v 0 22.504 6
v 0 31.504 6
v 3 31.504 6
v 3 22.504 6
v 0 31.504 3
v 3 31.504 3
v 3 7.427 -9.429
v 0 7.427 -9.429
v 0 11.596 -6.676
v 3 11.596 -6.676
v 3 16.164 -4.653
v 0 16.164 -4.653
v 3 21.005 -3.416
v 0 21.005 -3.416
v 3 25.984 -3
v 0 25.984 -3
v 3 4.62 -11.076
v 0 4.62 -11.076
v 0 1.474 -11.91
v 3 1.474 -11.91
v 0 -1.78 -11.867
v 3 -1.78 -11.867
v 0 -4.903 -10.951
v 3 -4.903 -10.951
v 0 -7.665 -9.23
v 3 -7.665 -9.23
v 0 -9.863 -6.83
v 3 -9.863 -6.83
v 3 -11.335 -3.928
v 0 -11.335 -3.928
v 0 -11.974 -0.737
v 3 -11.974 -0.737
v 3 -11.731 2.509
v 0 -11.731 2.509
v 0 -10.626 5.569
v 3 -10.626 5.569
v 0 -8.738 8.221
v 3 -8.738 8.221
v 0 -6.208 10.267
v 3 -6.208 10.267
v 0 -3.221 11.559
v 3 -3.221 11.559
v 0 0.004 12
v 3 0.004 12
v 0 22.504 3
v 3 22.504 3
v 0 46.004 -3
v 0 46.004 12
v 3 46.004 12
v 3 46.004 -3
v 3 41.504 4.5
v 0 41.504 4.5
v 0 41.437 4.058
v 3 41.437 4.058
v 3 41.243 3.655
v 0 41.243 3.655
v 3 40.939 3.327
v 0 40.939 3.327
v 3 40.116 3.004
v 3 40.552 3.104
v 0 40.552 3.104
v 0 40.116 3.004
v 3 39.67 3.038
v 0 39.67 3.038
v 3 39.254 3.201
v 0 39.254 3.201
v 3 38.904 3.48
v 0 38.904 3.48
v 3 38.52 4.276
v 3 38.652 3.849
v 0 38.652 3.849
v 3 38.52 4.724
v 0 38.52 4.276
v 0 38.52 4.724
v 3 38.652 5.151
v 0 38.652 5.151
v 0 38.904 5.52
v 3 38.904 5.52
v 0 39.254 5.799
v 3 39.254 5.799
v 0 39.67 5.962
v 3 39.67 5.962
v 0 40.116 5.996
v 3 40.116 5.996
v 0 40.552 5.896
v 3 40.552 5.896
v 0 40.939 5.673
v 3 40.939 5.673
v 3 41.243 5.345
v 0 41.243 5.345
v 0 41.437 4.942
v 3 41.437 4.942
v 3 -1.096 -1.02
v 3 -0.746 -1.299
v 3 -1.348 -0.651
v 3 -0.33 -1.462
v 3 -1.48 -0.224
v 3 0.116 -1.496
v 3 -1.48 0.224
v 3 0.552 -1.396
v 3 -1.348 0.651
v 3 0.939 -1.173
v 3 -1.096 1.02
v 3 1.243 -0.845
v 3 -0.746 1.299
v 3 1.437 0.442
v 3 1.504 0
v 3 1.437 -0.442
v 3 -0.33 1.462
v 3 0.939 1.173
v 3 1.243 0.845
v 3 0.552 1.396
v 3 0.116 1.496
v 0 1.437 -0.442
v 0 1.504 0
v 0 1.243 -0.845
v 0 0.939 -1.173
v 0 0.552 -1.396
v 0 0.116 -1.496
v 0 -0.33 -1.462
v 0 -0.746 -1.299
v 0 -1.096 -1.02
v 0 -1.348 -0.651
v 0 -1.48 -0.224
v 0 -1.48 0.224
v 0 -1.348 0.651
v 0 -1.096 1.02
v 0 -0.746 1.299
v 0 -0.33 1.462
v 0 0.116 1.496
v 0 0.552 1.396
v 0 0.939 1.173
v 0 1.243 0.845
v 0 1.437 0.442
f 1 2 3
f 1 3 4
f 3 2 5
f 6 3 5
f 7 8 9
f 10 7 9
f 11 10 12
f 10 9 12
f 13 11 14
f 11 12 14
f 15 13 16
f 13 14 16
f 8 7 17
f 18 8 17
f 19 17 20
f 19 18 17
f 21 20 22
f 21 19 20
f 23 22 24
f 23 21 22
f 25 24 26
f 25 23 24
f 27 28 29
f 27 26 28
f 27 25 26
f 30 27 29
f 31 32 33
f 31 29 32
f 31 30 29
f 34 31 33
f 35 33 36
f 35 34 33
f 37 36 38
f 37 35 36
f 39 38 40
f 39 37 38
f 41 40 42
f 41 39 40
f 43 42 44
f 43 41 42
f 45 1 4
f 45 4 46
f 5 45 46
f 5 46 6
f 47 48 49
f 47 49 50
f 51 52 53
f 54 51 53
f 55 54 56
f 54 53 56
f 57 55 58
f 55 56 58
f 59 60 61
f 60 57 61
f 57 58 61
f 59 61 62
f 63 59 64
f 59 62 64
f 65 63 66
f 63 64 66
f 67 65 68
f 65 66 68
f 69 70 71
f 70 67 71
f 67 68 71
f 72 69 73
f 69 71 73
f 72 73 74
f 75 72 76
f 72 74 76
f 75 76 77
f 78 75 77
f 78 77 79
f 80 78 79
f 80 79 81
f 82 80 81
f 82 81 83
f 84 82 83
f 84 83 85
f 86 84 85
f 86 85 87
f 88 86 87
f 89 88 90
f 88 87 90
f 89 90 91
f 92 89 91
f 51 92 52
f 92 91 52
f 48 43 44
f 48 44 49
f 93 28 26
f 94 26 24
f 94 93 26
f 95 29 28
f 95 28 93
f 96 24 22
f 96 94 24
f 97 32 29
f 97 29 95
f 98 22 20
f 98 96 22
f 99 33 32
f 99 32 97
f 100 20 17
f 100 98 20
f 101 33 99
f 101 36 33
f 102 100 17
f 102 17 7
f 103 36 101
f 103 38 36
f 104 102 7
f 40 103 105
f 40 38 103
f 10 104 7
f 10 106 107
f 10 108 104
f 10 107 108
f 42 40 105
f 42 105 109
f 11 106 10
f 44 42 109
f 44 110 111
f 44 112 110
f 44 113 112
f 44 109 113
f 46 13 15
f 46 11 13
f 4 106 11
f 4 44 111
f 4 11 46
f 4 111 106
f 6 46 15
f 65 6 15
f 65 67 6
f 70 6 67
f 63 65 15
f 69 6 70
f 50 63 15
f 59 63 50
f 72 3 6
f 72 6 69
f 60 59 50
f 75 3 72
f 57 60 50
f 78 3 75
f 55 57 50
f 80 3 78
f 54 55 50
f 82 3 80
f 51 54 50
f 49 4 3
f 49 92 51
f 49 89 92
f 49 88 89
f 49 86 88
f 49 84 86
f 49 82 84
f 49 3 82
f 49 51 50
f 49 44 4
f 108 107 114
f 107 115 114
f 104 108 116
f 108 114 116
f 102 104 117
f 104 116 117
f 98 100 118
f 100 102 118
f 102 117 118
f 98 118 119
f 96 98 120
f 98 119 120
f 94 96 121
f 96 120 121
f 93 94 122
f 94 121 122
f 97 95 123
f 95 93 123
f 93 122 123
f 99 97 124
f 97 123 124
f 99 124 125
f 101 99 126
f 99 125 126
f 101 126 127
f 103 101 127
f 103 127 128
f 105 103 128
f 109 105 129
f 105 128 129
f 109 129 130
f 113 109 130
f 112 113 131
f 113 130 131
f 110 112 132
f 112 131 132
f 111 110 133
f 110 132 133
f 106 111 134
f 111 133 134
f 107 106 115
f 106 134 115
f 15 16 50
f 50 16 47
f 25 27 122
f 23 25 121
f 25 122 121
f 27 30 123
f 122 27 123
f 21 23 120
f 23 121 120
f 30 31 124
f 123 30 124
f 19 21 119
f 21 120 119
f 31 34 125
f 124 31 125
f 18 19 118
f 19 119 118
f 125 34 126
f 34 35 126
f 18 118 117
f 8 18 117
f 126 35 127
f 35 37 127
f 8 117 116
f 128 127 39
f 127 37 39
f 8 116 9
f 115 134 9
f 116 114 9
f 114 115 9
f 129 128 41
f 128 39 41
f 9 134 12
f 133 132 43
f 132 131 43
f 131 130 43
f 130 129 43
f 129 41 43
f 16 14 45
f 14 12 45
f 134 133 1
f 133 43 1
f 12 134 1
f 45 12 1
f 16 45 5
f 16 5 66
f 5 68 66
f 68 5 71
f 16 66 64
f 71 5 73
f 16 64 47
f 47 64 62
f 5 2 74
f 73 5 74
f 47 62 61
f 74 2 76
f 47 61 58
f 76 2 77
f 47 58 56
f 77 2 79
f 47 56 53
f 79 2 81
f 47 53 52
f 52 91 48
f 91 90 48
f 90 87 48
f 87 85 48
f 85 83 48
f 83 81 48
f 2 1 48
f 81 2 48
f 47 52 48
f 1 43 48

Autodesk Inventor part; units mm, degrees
ref_plane "YZ Plane" through (0, 0, 0) normal (1, 0, 0) x (0, 1, 0)
ref_plane "XZ Plane" through (0, 0, 0) normal (0, 1, 0) x (-1, 0, 0)
ref_plane "XY Plane" through (0, 0, 0) normal (0, 0, 1) x (1, 0, 0)
sketch "Sketch1" plane through (0, 0, 0) normal (1, 0, 0) x (0, 1, 0)
  circle A0 centre (0.0036, 0) radius 1.5
  line L0 (-11.9964, 37.6945) -> (46.0036, 37.6945) construction
  line L1 (0.0036, 12) -> (46.0036, 12)
  line L2 (46.0036, 12) -> (46.0036, -3)
  arc A1 (25.9843, -3) -> (7.4266, -9.4286) centre (25.9843, -33) ccw
  line L3 (25.9843, -3) -> (46.0036, -3)
  arc A2 (25.9843, -3) -> (7.4266, -9.4286) centre (25.9843, -33) ccw projected
  line L4 (25.9843, -3) -> (46.0036, -3) projected
  line L5 (46.0036, -3) -> (46.0036, 12) projected
  line L6 (46.0036, 12) -> (0.0036, 12) projected
  circle A3 centre (40.0036, 4.5) radius 1.5 projected
  arc A4 (0.0036, 12) -> (7.4266, -9.4286) centre (0.0036, 0) ccw
  circle A5 centre (40.0036, 4.5) radius 1.5
  line L7 (31.5036, 6) -> (22.5036, 6)
  line L8 (22.5036, 6) -> (22.5036, 3)
  line L9 (22.5036, 3) -> (31.5036, 3)
  line L10 (31.5036, 6) -> (31.5036, 3)
  point P0 (0, 0)
  point P1 (1.5, 26.1095)
  point P2 (22.5, 26.1095)
  dimension "d9" = 58
  dimension "d18" = 9
  dimension "d19" = 3
  dimension "d20" = 6
  dimension "d21" = 7.5
  dimension "d22" = 3
  dimension "d23" = 15
  dimension "d24" = 12
  dimension "d25" = 8.5
extrude "Extrusion1" add sketch "Sketch1" along normal blind 3
properties part number "Brazo3Izquierda"
